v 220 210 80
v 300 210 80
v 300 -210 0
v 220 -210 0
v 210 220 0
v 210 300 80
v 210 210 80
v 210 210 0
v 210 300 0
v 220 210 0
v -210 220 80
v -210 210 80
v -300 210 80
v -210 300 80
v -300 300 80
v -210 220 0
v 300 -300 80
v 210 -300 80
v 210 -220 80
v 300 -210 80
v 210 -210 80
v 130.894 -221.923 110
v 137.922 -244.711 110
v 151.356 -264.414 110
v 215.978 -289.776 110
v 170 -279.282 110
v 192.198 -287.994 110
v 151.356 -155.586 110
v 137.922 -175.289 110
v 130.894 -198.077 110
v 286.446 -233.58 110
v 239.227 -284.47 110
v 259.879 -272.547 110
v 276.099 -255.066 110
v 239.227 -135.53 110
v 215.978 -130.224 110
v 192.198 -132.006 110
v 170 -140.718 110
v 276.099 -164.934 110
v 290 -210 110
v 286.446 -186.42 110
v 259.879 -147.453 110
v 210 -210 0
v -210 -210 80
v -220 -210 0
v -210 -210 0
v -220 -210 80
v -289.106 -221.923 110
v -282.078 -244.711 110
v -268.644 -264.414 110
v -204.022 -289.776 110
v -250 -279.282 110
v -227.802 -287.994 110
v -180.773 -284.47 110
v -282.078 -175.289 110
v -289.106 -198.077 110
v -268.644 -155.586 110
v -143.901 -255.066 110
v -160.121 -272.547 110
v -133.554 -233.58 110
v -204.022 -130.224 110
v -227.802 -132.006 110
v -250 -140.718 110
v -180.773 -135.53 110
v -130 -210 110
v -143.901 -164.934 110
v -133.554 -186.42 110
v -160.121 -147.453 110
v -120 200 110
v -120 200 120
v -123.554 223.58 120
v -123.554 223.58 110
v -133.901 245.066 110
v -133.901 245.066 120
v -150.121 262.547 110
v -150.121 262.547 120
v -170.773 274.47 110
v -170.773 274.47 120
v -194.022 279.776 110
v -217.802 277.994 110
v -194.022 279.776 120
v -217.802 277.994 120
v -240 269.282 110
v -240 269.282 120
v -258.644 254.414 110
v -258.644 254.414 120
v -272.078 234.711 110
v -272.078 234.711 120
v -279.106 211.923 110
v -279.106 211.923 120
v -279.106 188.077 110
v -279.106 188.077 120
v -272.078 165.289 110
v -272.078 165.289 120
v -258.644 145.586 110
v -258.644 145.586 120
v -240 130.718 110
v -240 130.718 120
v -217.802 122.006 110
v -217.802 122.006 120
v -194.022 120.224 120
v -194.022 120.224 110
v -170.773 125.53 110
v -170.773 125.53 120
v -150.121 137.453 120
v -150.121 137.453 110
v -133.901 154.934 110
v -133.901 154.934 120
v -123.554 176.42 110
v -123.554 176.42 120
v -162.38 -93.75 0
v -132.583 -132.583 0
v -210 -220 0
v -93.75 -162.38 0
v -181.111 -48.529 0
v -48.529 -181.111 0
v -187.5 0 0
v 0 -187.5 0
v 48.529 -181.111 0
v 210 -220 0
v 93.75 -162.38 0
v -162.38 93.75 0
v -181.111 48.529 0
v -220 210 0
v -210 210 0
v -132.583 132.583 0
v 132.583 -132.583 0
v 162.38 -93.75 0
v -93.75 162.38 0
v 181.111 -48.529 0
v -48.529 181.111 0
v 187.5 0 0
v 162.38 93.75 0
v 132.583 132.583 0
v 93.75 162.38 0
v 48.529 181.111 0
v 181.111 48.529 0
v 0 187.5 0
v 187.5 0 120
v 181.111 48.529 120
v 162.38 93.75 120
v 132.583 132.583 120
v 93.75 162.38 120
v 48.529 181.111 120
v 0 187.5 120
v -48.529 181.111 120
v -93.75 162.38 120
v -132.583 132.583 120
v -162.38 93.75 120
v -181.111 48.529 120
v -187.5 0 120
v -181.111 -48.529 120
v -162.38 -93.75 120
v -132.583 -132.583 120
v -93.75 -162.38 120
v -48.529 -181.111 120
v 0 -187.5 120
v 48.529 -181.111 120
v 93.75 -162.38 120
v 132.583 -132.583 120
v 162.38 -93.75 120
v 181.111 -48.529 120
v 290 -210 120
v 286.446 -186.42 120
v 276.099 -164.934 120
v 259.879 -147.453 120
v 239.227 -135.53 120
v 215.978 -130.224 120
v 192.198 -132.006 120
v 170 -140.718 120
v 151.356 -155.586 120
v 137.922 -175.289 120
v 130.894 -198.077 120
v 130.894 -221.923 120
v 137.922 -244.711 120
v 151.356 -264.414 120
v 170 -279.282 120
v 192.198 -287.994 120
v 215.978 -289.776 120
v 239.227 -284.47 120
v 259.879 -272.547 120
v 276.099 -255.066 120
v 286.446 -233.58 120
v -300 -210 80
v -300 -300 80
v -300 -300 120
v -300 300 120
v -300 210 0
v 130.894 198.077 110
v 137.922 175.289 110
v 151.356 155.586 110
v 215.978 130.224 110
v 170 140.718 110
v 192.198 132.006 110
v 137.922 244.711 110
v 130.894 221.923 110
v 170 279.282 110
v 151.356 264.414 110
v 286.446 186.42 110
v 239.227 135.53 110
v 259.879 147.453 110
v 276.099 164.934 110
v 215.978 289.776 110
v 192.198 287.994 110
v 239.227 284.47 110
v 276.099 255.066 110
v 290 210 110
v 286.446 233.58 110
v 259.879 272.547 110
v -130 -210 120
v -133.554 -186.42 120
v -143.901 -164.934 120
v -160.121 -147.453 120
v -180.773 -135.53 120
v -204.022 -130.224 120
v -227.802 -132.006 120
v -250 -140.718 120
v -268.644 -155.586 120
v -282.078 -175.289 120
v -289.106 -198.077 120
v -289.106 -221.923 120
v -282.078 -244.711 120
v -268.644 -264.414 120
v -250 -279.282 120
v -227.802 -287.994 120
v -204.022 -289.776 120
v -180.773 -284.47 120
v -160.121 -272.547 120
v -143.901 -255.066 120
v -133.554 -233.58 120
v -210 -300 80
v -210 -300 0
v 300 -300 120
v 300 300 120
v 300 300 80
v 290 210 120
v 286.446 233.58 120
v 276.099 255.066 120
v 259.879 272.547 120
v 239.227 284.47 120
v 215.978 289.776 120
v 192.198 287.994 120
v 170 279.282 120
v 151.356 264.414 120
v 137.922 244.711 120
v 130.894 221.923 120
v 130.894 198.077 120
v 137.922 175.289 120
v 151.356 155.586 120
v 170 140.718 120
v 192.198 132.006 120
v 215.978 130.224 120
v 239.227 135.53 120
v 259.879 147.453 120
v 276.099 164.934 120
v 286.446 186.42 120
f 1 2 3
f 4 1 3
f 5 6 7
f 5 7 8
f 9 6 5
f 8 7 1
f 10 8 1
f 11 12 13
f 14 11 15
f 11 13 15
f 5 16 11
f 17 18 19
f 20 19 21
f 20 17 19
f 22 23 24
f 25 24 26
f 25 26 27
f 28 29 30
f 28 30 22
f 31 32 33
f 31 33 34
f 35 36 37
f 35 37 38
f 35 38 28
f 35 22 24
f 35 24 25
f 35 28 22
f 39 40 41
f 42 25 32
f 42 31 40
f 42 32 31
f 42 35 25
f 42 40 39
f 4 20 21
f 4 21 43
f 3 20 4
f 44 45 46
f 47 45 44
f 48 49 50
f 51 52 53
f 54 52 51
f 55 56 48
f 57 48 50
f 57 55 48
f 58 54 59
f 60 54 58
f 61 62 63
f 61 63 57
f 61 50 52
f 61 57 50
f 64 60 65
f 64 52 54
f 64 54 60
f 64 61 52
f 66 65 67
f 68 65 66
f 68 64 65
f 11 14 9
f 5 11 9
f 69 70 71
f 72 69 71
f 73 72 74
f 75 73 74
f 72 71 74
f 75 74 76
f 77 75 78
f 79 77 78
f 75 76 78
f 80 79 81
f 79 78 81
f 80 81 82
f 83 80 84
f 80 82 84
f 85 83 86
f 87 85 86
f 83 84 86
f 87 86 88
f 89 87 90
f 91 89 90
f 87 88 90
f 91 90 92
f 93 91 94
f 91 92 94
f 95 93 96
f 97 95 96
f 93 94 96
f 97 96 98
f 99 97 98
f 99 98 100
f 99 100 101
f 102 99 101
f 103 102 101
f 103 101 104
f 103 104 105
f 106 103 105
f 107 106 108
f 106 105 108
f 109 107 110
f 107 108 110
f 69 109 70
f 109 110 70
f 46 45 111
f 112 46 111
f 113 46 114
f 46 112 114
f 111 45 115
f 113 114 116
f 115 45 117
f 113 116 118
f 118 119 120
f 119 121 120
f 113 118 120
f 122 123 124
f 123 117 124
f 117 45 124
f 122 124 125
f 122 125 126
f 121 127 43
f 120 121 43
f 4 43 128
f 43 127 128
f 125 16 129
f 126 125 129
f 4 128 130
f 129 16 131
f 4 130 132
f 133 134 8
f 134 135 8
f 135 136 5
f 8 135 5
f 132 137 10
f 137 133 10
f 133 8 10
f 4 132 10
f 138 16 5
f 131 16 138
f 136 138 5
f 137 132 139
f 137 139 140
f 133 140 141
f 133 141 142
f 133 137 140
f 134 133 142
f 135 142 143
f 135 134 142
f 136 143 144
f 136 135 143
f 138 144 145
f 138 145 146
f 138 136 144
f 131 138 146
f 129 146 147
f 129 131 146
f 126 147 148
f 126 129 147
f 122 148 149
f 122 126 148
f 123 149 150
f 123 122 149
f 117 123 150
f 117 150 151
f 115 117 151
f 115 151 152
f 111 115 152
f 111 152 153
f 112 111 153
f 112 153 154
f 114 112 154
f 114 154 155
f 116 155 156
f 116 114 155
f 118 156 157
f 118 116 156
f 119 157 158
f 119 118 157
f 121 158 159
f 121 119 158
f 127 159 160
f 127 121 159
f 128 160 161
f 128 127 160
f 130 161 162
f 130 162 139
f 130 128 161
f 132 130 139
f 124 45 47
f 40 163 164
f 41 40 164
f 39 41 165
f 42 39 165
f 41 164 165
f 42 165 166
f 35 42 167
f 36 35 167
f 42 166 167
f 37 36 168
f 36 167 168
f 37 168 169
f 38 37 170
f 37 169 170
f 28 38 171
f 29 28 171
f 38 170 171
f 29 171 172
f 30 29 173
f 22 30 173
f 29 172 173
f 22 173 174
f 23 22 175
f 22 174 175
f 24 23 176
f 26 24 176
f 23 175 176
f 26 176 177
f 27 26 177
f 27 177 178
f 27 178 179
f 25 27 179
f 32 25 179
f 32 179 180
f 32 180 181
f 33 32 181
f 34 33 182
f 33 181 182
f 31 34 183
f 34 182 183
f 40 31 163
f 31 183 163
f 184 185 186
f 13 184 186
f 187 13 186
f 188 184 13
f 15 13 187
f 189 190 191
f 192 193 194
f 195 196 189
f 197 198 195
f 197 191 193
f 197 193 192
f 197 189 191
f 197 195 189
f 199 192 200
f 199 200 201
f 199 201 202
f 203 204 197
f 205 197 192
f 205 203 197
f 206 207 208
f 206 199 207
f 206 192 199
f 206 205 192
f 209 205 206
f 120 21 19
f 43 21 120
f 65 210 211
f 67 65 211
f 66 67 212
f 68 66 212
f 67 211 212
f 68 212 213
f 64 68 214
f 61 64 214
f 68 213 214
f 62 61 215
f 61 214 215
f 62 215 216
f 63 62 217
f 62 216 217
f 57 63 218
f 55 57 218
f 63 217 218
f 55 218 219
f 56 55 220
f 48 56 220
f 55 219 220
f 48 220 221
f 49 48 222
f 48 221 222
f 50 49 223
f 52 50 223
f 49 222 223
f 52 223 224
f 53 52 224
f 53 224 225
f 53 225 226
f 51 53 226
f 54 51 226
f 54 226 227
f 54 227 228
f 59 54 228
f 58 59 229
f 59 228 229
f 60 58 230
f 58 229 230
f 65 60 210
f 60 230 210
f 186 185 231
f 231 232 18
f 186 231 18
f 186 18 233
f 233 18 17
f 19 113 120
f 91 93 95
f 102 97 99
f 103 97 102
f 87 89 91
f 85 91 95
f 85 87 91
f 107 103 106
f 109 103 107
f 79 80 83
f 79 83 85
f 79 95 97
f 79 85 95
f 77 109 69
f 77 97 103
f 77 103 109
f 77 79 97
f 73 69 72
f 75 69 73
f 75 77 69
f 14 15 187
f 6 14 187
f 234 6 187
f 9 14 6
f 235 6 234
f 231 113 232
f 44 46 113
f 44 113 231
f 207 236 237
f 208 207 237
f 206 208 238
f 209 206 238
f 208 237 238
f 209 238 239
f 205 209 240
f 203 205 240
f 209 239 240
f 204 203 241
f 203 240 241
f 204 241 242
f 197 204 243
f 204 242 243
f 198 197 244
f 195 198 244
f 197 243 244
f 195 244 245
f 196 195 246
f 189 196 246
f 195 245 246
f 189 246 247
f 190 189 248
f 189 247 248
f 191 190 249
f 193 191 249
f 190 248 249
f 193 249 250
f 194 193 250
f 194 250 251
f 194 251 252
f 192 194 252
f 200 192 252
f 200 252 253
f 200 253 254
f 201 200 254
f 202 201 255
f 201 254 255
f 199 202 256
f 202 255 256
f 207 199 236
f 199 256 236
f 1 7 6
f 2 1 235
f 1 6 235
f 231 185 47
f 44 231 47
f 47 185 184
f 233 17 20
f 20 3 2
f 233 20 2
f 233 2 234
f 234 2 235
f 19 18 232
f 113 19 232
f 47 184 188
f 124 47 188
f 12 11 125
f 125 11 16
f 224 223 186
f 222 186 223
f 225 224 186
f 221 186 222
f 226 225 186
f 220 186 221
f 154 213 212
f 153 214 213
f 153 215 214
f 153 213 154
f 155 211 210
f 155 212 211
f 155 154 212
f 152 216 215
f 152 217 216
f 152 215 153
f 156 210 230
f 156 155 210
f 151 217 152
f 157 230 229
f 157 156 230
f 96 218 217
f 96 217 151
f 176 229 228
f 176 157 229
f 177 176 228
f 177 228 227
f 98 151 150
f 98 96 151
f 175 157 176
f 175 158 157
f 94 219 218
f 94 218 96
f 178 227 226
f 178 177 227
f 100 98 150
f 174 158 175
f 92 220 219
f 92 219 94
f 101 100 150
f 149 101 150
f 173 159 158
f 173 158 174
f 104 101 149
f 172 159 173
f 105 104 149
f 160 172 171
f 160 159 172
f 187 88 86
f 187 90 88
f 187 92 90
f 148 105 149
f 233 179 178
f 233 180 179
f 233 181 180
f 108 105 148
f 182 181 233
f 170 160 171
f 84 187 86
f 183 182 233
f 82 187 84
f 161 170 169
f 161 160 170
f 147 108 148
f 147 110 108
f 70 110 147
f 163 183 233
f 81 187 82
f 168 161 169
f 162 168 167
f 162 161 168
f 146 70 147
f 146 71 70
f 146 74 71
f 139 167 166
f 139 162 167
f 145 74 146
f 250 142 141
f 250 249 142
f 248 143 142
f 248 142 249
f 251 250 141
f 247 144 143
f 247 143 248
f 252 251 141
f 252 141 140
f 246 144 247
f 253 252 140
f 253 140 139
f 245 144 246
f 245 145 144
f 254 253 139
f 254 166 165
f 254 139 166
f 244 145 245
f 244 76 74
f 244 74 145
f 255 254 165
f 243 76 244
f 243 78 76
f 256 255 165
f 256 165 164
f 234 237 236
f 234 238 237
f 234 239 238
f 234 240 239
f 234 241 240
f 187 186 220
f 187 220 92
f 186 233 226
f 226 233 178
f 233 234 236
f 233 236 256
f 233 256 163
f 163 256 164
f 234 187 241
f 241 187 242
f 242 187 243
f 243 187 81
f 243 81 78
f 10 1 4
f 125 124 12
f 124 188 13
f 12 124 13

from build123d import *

# Parameters (mm, degrees)
CROQUIS1_W              = 600
CROQUIS1_H              = 600
CROQUIS1_R              = 187.5
SALIENTE_EXTRUIR1_DEPTH = 120
CROQUIS3_W              = 80
CROQUIS3_H              = 90
CORTAR_EXTRUIR2_DEPTH   = 80
CROQUIS5_W              = 80
CROQUIS5_H              = 90
CORTAR_EXTRUIR3_DEPTH   = 90
CORTAR_EXTRUIR4_DEPTH   = 80
CROQUIS7_W              = 89.245379234
CROQUIS7_H              = 80
CORTAR_EXTRUIR5_DEPTH   = 90
CORTAR_EXTRUIR13_DEPTH  = 80
CROQUIS10_W             = 90
CROQUIS10_H             = 80
CORTAR_EXTRUIR15_DEPTH  = 90
CORTAR_EXTRUIR17_DEPTH  = 80
CROQUIS12_W             = 80
CROQUIS12_H             = 90
CORTAR_EXTRUIR19_DEPTH  = 90
CROQUIS13_R             = 80
CORTAR_EXTRUIR20_DEPTH  = 10
CROQUIS14_R             = 80
CORTAR_EXTRUIR21_DEPTH  = 10


with BuildPart() as part:
    # Croquis1 → Saliente-Extruir1 (new body)
    with BuildSketch(Plane.XY):
        Rectangle(CROQUIS1_W, CROQUIS1_H)
        Circle(CROQUIS1_R, mode=Mode.SUBTRACT)
    extrude(amount=SALIENTE_EXTRUIR1_DEPTH)

    # Croquis3 → Cortar-Extruir2 (cut)
    with BuildSketch(Plane.ZY.offset(300)):
        Polygon((0, 210), (0, -210), (80, -210), align=None)
        with Locations((40, 255)):
            Rectangle(CROQUIS3_W, CROQUIS3_H)
    extrude(amount=-CORTAR_EXTRUIR2_DEPTH, mode=Mode.SUBTRACT)

    # Croquis5 → Cortar-Extruir3 (cut)
    with BuildSketch(Plane.ZY.offset(300)):
        with Locations((40, -255)):
            Rectangle(CROQUIS5_W, CROQUIS5_H)
    extrude(amount=-CORTAR_EXTRUIR3_DEPTH, mode=Mode.SUBTRACT)

    # Croquis6 → Cortar-Extruir4 (cut)
    with BuildSketch(Plane(origin=(0, 300, 0), x_dir=(1, 0, 0), z_dir=(0, 1, 0))):
        Polygon((-210, -80), (210, 0), (-210, 0), align=None)
    extrude(amount=-CORTAR_EXTRUIR4_DEPTH, mode=Mode.SUBTRACT)

    # Croquis7 → Cortar-Extruir5 (cut)
    with BuildSketch(Plane(origin=(0, 300, 0), x_dir=(1, 0, 0), z_dir=(0, 1, 0))):
        with Locations((-254.622689617, -40)):
            Rectangle(CROQUIS7_W, CROQUIS7_H)
    extrude(amount=-CORTAR_EXTRUIR5_DEPTH, mode=Mode.SUBTRACT)

    # Croquis8 → Cortar-Extruir13 (cut)
    with BuildSketch(Plane(origin=(300, 0, 0), x_dir=(0, 0, -1), z_dir=(1, 0, 0))):
        Polygon((-80, 210), (0, -210), (0, 210), align=None)
    extrude(amount=-CORTAR_EXTRUIR13_DEPTH, mode=Mode.SUBTRACT)

    # Croquis10 → Cortar-Extruir15 (cut)
    with BuildSketch(Plane(origin=(0, 300, 0), x_dir=(1, 0, 0), z_dir=(0, 1, 0))):
        with Locations((255, -40)):
            Rectangle(CROQUIS10_W, CROQUIS10_H)
    extrude(amount=-CORTAR_EXTRUIR15_DEPTH, mode=Mode.SUBTRACT)

    # Croquis11 → Cortar-Extruir17 (cut)
    with BuildSketch(Plane.XZ.offset(300)):
        Polygon((210, 80), (-210, 0), (210, 0), align=None)
    extrude(amount=-CORTAR_EXTRUIR17_DEPTH, mode=Mode.SUBTRACT)

    # Croquis12 → Cortar-Extruir19 (cut)
    with BuildSketch(Plane(origin=(300, 0, 0), x_dir=(0, 0, -1), z_dir=(1, 0, 0))):
        with Locations((-40, -255)):
            Rectangle(CROQUIS12_W, CROQUIS12_H)
    extrude(amount=-CORTAR_EXTRUIR19_DEPTH, mode=Mode.SUBTRACT)

    # Croquis13 → Cortar-Extruir20 (cut)
    with BuildSketch(Plane.XY.offset(120)):
        with Locations((-200, 200)):
            Circle(CROQUIS13_R)
    extrude(amount=-CORTAR_EXTRUIR20_DEPTH, mode=Mode.SUBTRACT)

    # Croquis14 → Cortar-Extruir21 (cut)
    with BuildSketch(Plane.XY.offset(120)):
        with Locations((-210, -210)):
            Circle(CROQUIS14_R)
        with Locations((210, -210)):
            Circle(CROQUIS14_R)
        with Locations((210, 210)):
            Circle(CROQUIS14_R)
    extrude(amount=-CORTAR_EXTRUIR21_DEPTH, mode=Mode.SUBTRACT)


solid = part.part
